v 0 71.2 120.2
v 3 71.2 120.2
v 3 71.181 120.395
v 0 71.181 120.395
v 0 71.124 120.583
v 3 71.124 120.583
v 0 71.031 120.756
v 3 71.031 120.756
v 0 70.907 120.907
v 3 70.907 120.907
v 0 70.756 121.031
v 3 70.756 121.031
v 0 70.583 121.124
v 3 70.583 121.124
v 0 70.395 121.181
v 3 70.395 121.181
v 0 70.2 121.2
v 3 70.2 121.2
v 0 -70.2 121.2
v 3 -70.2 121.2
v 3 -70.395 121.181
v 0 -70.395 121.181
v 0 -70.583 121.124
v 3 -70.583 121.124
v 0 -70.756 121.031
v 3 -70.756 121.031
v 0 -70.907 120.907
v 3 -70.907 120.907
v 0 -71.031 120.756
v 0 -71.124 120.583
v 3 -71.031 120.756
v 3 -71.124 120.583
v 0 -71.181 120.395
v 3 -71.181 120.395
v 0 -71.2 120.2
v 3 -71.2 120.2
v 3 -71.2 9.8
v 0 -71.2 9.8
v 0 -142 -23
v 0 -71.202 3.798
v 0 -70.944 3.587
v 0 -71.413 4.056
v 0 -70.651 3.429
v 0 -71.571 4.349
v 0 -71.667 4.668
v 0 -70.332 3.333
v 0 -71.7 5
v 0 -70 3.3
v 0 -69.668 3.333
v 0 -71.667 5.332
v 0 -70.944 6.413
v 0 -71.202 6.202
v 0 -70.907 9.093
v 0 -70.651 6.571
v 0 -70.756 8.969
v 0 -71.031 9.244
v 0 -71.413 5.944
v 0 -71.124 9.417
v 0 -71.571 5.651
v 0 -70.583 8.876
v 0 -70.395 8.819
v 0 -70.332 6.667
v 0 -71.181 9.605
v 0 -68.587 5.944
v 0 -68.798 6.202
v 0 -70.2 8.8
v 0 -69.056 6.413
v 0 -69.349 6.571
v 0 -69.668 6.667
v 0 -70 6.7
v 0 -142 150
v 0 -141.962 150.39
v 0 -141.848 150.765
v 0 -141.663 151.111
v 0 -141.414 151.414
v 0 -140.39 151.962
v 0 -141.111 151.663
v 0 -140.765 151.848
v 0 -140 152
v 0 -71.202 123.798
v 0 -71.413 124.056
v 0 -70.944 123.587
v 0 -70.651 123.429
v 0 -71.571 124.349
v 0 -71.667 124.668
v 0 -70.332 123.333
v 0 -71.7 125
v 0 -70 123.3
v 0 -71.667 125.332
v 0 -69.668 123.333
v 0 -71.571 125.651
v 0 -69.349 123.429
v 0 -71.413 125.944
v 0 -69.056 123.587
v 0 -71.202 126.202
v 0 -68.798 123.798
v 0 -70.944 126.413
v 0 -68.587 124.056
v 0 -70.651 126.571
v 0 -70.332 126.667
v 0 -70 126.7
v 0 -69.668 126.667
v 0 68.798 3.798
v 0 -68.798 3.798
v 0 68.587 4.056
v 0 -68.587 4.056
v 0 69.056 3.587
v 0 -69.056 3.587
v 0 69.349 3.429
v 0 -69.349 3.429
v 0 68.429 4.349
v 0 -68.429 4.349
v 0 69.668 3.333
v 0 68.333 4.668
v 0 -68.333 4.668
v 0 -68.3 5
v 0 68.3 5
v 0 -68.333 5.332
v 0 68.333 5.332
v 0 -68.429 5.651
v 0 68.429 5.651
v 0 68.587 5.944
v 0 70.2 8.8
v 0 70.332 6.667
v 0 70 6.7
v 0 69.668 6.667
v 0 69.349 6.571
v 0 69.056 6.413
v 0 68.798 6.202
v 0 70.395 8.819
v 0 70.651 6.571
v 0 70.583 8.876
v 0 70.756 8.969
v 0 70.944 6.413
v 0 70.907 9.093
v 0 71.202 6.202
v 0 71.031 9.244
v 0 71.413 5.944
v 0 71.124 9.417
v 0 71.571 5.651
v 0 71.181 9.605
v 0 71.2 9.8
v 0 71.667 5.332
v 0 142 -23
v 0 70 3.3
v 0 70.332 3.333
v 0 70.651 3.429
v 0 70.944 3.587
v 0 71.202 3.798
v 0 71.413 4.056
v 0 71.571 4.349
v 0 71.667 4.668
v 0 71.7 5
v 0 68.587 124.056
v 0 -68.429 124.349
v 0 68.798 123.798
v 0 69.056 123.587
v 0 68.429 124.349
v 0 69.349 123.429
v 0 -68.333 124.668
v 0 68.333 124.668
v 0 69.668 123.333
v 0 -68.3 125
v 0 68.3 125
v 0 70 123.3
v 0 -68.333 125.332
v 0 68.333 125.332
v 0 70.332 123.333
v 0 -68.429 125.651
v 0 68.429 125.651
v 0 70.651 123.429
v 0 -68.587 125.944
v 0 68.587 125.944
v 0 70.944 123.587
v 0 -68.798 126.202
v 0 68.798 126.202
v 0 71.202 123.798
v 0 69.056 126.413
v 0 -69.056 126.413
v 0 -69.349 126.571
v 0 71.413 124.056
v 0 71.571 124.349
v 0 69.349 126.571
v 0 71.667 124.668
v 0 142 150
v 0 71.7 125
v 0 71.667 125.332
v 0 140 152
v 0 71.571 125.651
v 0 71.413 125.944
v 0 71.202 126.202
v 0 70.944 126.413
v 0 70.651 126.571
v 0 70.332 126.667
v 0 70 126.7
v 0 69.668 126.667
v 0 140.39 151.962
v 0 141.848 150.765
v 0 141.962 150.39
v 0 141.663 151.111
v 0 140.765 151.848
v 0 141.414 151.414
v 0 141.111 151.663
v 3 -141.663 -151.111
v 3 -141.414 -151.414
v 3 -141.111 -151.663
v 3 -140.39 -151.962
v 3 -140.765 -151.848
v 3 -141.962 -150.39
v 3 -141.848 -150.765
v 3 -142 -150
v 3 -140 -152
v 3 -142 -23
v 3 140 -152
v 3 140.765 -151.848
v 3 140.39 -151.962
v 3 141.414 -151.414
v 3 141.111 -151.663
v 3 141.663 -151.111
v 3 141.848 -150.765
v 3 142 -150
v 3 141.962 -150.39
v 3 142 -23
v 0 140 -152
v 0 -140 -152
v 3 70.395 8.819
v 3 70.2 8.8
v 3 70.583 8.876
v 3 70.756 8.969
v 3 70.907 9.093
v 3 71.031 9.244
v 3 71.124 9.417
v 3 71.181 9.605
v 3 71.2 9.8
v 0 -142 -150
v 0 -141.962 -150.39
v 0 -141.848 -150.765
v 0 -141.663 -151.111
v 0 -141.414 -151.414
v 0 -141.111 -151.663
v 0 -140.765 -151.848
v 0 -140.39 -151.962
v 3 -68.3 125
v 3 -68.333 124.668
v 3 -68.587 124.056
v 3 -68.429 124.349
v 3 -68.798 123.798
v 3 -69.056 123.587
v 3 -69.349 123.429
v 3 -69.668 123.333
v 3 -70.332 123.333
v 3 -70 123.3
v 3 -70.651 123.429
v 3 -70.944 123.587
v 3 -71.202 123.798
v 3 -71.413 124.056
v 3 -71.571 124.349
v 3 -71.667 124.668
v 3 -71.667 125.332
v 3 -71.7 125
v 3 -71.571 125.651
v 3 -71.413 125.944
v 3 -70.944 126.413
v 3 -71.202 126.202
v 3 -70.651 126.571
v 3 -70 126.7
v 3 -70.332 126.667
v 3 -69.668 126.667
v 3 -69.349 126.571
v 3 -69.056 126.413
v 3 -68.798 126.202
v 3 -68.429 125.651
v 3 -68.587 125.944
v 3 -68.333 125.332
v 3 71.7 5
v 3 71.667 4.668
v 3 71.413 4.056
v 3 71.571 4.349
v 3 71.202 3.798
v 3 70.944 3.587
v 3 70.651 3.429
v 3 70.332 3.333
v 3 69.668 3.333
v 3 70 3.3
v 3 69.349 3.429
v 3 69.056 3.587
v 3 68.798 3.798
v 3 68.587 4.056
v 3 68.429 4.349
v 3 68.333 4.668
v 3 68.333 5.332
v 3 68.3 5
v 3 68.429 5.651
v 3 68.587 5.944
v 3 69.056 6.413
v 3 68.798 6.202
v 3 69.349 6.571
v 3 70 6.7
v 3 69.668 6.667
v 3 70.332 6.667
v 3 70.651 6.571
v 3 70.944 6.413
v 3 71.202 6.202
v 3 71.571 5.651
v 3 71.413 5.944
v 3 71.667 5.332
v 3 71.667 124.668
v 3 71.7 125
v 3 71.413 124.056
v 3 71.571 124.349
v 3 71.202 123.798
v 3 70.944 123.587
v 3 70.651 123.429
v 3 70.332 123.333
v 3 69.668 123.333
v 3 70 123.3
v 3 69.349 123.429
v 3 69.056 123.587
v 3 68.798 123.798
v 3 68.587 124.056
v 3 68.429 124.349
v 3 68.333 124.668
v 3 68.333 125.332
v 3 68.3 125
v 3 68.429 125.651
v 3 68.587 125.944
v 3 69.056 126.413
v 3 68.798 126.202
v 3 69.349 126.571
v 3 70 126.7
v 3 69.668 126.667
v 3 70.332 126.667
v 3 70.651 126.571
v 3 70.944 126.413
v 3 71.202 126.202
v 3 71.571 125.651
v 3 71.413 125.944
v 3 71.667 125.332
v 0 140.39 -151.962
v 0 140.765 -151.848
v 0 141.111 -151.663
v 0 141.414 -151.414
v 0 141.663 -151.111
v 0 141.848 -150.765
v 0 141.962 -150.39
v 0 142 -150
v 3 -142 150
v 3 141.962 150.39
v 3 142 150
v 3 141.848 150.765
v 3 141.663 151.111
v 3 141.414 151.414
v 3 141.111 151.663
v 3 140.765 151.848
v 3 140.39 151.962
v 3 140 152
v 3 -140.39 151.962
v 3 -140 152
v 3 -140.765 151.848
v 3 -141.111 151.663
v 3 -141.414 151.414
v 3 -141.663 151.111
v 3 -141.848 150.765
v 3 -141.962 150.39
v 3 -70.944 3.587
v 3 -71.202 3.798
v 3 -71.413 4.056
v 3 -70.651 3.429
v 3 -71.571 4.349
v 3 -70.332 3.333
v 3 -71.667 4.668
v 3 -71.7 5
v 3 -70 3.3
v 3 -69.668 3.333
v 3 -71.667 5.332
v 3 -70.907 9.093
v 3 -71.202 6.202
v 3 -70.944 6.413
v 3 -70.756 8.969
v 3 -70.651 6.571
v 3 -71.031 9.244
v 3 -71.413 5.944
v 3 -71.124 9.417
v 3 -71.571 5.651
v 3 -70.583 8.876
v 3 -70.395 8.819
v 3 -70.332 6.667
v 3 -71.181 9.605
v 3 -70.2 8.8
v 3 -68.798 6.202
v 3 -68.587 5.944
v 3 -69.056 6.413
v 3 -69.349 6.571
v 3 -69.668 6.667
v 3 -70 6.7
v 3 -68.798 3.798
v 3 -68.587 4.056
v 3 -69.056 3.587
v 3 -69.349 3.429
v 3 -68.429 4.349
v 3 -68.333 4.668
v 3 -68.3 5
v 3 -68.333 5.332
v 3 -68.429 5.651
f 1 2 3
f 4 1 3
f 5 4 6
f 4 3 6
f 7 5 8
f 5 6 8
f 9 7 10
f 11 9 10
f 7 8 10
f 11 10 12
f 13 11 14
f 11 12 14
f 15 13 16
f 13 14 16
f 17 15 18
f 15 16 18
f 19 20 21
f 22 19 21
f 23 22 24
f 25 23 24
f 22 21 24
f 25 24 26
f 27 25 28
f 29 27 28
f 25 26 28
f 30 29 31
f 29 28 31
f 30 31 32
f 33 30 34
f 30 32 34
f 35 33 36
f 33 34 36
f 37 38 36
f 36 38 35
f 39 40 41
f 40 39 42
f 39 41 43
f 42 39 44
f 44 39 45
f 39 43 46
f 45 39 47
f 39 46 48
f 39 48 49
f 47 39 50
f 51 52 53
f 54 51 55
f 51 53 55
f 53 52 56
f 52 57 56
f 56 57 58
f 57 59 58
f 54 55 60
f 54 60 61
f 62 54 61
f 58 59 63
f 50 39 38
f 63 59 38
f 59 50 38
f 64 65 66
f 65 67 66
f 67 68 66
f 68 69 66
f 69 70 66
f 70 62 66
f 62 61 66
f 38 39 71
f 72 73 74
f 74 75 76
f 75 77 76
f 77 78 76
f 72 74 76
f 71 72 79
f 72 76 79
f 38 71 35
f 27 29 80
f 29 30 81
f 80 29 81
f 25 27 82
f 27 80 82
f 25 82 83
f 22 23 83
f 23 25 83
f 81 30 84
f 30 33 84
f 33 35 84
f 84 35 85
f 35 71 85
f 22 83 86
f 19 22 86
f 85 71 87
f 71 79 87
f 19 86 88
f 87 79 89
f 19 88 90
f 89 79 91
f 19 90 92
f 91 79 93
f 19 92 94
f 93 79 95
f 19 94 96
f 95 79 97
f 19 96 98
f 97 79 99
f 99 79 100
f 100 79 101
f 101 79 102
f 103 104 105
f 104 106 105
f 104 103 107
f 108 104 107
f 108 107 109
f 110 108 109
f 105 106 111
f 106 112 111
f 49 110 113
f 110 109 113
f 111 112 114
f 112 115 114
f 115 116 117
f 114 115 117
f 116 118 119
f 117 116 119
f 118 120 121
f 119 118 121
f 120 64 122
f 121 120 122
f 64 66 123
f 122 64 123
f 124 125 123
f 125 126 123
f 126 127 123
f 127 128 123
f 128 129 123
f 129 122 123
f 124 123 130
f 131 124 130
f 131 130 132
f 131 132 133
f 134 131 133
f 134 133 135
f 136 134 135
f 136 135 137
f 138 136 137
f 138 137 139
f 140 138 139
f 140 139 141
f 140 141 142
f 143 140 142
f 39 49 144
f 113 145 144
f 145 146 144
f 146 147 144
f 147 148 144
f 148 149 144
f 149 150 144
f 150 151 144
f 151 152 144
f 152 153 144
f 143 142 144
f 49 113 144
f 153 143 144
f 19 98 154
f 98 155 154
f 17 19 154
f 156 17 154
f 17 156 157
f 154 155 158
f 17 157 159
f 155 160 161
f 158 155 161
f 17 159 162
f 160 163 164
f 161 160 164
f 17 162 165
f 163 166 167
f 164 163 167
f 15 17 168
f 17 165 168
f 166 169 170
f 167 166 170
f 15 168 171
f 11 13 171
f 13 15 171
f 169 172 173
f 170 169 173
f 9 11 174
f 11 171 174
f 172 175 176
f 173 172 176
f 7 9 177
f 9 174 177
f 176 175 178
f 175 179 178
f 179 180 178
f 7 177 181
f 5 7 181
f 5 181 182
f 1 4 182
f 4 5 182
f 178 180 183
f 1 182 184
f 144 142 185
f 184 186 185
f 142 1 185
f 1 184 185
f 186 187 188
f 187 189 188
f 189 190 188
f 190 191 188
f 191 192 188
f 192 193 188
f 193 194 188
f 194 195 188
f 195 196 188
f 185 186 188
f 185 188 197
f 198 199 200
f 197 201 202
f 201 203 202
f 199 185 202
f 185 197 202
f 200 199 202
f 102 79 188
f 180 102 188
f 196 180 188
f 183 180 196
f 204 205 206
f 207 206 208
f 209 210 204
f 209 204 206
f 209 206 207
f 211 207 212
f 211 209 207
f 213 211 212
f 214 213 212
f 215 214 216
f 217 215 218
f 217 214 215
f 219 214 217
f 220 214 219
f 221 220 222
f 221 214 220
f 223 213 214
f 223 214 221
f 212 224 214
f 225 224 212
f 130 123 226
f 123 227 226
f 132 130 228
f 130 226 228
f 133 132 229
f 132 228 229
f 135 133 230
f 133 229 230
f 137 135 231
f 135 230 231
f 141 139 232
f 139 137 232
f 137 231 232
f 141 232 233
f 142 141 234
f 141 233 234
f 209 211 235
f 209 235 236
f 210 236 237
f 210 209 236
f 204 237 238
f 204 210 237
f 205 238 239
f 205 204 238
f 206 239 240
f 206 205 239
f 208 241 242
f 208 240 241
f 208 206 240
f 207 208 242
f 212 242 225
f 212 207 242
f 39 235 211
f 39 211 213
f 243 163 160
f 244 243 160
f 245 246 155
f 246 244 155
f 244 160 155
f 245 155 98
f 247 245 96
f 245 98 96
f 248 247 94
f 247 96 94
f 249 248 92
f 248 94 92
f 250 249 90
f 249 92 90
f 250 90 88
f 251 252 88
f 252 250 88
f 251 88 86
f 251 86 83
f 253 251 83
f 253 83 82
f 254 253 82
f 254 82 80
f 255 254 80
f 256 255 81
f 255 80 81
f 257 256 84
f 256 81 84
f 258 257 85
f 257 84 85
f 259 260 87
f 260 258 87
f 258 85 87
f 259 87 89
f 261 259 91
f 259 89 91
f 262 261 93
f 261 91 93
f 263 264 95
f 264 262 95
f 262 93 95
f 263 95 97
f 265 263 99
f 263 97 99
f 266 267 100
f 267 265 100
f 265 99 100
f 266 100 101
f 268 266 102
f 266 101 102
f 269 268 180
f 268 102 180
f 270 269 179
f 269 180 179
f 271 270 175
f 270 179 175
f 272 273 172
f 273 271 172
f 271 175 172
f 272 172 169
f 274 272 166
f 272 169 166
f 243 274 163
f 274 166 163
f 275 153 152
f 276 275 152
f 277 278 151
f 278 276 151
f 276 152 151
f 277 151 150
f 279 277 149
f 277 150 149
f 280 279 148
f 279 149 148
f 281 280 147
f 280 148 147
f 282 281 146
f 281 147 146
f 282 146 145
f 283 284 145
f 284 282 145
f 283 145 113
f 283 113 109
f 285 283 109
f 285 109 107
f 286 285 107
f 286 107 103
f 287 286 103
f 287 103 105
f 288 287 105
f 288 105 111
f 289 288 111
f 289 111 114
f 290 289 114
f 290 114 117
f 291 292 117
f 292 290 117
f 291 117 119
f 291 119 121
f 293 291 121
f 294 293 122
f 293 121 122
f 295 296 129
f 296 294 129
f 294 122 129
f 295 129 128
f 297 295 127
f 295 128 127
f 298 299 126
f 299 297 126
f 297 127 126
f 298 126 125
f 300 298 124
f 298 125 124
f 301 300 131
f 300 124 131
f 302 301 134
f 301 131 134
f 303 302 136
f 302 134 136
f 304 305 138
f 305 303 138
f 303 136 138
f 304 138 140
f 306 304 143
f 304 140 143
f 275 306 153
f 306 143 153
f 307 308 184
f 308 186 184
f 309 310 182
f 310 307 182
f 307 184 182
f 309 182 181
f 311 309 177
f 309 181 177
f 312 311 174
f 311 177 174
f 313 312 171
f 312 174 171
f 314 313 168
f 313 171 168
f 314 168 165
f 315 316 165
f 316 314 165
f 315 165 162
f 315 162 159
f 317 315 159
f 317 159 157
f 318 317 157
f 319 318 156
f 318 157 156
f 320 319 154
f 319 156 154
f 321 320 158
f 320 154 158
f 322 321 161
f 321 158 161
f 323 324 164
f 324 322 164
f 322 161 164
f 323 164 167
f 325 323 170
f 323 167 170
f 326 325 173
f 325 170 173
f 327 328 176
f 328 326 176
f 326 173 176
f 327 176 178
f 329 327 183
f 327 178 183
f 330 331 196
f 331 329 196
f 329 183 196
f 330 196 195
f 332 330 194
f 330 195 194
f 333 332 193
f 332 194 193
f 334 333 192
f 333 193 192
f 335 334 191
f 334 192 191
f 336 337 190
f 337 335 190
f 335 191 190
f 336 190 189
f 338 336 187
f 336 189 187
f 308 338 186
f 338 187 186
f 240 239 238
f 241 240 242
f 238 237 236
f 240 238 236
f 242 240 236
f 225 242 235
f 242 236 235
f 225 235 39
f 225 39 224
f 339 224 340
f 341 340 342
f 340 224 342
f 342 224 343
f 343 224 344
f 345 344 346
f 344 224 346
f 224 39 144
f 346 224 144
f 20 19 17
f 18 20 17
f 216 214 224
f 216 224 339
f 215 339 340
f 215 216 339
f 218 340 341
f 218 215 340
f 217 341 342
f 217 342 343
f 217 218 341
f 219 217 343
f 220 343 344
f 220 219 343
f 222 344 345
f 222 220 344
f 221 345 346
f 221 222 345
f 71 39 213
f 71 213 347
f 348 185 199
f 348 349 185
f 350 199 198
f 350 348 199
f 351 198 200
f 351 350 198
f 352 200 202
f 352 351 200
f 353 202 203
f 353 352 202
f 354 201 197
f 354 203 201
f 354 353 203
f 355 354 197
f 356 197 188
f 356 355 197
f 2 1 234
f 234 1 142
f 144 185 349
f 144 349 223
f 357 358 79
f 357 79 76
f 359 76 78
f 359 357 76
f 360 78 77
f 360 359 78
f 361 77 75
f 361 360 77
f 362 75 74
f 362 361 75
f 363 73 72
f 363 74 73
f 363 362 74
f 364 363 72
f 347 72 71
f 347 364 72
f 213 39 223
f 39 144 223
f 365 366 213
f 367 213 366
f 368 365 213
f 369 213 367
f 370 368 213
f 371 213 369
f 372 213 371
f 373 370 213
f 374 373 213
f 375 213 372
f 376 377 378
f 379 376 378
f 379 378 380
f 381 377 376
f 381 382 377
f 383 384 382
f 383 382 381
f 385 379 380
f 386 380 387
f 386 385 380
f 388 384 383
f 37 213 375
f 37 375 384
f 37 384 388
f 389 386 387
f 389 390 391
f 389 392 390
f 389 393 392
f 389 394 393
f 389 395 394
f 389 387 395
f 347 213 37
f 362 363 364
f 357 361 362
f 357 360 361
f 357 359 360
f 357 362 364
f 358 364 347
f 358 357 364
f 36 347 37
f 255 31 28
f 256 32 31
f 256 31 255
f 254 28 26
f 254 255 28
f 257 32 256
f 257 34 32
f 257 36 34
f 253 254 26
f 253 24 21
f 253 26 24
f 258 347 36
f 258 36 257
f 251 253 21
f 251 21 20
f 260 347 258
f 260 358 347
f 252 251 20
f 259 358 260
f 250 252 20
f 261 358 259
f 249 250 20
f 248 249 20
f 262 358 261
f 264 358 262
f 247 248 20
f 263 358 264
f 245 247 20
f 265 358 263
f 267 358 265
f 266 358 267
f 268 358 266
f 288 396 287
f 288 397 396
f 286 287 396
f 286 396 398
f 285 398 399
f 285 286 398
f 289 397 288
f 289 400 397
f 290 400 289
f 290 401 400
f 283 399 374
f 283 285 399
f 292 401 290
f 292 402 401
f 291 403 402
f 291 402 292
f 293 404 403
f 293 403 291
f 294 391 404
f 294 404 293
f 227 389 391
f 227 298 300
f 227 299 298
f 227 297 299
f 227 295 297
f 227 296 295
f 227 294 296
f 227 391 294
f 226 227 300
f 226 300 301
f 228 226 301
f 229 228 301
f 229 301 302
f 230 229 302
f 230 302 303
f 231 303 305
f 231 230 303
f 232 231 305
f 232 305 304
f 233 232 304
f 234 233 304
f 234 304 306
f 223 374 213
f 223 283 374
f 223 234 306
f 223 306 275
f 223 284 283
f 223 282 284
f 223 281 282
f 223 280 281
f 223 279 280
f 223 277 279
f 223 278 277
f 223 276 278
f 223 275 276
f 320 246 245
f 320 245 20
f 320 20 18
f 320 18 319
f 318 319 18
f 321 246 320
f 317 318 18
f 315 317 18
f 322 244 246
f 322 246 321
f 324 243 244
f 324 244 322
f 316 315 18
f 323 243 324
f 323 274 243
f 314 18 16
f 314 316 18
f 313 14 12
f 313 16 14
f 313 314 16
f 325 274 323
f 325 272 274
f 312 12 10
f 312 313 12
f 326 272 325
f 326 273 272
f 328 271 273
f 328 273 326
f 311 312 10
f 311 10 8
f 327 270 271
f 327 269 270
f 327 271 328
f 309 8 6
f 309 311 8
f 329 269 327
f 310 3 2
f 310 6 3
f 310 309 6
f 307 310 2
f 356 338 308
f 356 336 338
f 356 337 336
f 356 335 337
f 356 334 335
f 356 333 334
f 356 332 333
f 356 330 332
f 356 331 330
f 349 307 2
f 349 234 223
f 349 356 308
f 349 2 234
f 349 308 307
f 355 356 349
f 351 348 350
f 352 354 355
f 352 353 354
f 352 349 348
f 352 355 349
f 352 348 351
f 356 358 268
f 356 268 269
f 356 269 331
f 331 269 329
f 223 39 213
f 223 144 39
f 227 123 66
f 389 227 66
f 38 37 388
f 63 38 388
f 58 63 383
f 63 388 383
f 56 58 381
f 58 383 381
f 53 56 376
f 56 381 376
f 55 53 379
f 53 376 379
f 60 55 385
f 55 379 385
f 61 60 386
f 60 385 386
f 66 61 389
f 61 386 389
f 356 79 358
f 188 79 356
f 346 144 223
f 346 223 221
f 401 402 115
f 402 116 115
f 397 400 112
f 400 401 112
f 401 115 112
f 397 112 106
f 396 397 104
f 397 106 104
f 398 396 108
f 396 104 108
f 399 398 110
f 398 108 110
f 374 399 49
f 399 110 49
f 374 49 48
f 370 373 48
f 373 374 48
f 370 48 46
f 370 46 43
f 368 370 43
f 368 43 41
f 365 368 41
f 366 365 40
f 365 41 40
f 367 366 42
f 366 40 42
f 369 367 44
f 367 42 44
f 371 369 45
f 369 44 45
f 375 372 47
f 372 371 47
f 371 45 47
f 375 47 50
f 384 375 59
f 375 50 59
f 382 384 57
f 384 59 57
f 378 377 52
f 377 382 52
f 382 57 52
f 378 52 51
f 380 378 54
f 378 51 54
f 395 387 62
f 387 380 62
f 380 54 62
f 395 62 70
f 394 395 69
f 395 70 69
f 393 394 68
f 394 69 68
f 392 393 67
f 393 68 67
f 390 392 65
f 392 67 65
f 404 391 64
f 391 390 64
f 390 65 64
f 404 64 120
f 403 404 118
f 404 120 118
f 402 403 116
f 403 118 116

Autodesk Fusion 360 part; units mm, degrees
sketch "Sketch1" plane through (0, 0, 0) normal (1, 0, 0) x (0, 1, 0)
  line L0 (142, -152) -> (-142, -152)
  line L1 (-142, -152) -> (-142, 152)
  line L2 (-142, 152) -> (142, 152)
  line L3 (142, 152) -> (142, -152)
  line L4 (142, -152) -> (-142, 152) construction
  line L5 (-142, -152) -> (142, 152) construction
  line L6 (0, 0) -> (0, 65) construction
  line L7 (71.2, 8.8) -> (-71.2, 8.8)
  line L8 (-71.2, 8.8) -> (-71.2, 121.2)
  line L9 (-71.2, 121.2) -> (71.2, 121.2)
  line L10 (71.2, 121.2) -> (71.2, 8.8)
  line L11 (71.2, 8.8) -> (-71.2, 121.2) construction
  line L12 (-71.2, 8.8) -> (71.2, 121.2) construction
  line L13 (70, 5) -> (-70, 5) construction
  line L14 (-70, 5) -> (-70, 125) construction
  line L15 (-70, 125) -> (70, 125) construction
  line L16 (70, 125) -> (70, 5) construction
  line L17 (70, 5) -> (-70, 125) construction
  line L18 (-70, 5) -> (70, 125) construction
  line L19 (0, 152) -> (0, 142) construction
  circle A0 centre (-70, 125) radius 1.7
  circle A1 centre (70, 125) radius 1.7
  circle A2 centre (70, 5) radius 1.7
  circle A3 centre (-70, 5) radius 1.7
  point P0 (0, 65)
  point P1 (0, 65)
  dimension "d1" = 304
  dimension "d2" = 284
  dimension "d3" = 65
  dimension "d4" = 142.4
  dimension "d5" = 112.4
  dimension "d6" = 140
  dimension "d7" = 120
  dimension "d8" = 10
  dimension "d9" = 3.4
  dimension "d10" = 3.4
  dimension "d11" = 3.4
  dimension "d12" = 3.4
extrude "Extrude1" add sketch "Sketch1" along normal blind 3 makes body 1
fillet "Fillet1" radius 2 4 edges at (1.5, 142, -152) (1.5, -142, -152) (1.5, -142, 152) (1.5, 142, 152) on bodies 1
fillet "Fillet1" radius 1 4 edges at (1.5, 71.2, 121.2) (1.5, 71.2, 8.8) (1.5, -71.2, 8.8) (1.5, -71.2, 121.2) on bodies 1
ref_plane "WorkPlane1" through (1.5, 0, -23) normal (0, 0, 1) x (0, -1, 0)
split "Split1" by plane through (1.5, 0, -23) normal (0, 0, 1) bodies 1 makes body 2 at (0, 118.4, 45.6)
